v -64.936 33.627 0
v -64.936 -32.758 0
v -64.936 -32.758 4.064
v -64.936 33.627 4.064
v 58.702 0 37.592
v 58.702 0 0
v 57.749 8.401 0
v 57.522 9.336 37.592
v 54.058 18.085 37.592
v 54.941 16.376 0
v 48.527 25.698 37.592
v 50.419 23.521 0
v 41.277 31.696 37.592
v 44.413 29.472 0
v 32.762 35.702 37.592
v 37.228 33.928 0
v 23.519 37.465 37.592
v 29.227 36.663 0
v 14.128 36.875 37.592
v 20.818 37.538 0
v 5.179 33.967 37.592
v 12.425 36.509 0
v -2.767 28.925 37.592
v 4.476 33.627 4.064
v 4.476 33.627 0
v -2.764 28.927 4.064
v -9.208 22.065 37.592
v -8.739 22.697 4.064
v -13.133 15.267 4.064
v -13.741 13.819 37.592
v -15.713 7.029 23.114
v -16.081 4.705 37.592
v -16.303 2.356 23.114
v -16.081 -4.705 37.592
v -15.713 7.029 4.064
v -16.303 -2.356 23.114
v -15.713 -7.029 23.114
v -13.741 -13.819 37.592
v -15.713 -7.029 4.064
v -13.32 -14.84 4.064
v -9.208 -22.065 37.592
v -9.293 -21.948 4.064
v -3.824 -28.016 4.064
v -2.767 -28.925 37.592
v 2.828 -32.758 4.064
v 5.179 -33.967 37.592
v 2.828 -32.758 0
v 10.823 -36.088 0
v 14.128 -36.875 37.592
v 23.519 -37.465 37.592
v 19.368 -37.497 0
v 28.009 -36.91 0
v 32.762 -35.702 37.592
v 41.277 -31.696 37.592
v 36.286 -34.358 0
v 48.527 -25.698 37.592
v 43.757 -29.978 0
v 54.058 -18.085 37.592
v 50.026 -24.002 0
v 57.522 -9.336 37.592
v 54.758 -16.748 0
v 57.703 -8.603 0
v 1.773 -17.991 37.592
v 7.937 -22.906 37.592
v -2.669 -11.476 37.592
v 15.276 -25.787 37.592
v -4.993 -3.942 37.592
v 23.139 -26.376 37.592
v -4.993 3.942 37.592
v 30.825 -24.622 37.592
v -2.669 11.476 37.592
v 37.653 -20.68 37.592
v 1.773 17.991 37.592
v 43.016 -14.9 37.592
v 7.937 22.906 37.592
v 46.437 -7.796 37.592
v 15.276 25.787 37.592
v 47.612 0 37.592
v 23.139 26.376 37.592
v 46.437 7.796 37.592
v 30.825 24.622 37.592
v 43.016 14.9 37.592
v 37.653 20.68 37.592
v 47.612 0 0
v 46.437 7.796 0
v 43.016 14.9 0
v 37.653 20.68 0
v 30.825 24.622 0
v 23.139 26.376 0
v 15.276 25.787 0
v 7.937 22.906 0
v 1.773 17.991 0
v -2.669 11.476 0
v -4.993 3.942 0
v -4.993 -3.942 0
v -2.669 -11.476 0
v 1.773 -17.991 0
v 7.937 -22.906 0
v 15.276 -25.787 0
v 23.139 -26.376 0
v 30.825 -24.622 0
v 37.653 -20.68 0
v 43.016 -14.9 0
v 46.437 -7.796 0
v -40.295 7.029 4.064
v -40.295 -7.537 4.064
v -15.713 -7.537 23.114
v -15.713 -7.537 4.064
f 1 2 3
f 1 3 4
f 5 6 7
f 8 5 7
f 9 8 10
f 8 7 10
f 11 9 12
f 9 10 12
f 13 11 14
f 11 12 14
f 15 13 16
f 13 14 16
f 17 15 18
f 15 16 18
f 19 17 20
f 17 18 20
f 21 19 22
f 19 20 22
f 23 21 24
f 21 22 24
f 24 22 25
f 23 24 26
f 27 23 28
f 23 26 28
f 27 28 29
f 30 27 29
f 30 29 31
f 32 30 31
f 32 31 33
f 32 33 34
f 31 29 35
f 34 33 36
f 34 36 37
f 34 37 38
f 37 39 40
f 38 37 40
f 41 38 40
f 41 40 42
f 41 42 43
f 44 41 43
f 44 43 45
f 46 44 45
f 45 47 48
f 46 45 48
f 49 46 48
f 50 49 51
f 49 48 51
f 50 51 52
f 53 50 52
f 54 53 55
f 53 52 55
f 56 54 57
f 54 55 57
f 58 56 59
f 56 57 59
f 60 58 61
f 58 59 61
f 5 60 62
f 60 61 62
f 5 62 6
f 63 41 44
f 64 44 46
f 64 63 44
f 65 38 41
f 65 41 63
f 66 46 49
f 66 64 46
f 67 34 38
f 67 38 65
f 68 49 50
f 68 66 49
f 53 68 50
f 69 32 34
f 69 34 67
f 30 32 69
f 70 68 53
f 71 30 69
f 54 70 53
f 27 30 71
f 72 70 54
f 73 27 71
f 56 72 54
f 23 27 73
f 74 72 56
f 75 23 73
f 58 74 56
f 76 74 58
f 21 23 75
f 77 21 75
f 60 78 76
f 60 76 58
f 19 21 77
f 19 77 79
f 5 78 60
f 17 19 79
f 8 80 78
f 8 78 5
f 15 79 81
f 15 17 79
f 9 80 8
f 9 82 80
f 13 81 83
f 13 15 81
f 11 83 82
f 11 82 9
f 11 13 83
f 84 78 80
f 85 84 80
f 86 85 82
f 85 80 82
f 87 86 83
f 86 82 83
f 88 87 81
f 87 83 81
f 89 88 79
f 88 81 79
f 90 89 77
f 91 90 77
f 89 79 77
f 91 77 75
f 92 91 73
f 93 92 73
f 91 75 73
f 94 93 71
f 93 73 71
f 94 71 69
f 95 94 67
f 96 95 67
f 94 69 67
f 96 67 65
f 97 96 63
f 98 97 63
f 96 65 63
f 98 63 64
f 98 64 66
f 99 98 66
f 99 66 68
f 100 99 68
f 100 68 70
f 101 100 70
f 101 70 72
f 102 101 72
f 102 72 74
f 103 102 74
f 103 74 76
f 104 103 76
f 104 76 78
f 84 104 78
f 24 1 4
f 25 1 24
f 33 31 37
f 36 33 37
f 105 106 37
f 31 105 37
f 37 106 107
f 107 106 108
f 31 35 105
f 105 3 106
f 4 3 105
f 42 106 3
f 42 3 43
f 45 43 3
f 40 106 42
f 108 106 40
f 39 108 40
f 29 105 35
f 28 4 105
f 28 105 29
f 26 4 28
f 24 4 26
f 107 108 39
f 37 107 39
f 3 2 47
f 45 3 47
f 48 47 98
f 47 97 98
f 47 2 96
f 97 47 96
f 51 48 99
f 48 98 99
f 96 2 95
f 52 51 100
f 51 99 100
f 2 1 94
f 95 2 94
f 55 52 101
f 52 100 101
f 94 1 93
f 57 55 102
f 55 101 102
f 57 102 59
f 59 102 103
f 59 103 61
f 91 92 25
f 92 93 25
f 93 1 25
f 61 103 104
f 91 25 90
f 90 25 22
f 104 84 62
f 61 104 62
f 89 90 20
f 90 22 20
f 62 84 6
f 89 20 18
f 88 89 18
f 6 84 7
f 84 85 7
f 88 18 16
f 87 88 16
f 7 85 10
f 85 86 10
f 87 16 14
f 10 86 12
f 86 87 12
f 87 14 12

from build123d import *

# Parameters (mm, degrees)
F0_R     = 37.539526
F1_DEPTH = 37.592
F2_W     = 69.573917
F2_H     = 66.385109
F3_DEPTH = 4.064
F4_R     = 26.450097
F5_DEPTH = 37.593
F7_DEPTH = 19.05
F9_DEPTH = 45.0777


with BuildPart() as f1:
    # F0 (on Top) → F1 (new body)
    with BuildSketch(Plane.XY):
        with Locations((21.162063, 0)):
            Circle(F0_R)
    extrude(amount=F1_DEPTH)

    # F2 (on Top) → F3 (join)
    with BuildSketch(Plane.XY):
        with Locations((-30.148695, 0.434836)):
            Rectangle(F2_W, F2_H)
    extrude(amount=F3_DEPTH)

    # F4 (on face) → F5 (cut, through all)
    with BuildSketch(Plane.XY.offset(37.592)):
        with Locations((21.162063, 0)):
            Circle(F4_R)
    extrude(amount=-F5_DEPTH, mode=Mode.SUBTRACT)

    # F6 (on face) → F7 (join)
    with BuildSketch(Plane.XY.offset(4.064)):
        with BuildLine():
            ThreePointArc((-15.713447, -7.029422), (-16.377463, 0), (-15.713447, 7.029422))
            Line((-15.713447, 7.029422), (-40.294893, 7.029422))
            Line((-40.294893, 7.029422), (-40.294893, -7.537174))
            Line((-40.294893, -7.537174), (-15.713447, -7.537174))
            Line((-15.713447, -7.537174), (-15.713447, -7.029422))
        make_face()
    extrude(amount=F7_DEPTH)

    # F8 (on face) → F9 (cut, through all)
    with BuildSketch(Plane.XZ.offset(7.537174)):
        Polygon((-40.294893, 23.114), (-40.294893, 4.064), (-15.713447, 23.114), align=None)
    extrude(amount=-F9_DEPTH, mode=Mode.SUBTRACT)


solid = f1.part
